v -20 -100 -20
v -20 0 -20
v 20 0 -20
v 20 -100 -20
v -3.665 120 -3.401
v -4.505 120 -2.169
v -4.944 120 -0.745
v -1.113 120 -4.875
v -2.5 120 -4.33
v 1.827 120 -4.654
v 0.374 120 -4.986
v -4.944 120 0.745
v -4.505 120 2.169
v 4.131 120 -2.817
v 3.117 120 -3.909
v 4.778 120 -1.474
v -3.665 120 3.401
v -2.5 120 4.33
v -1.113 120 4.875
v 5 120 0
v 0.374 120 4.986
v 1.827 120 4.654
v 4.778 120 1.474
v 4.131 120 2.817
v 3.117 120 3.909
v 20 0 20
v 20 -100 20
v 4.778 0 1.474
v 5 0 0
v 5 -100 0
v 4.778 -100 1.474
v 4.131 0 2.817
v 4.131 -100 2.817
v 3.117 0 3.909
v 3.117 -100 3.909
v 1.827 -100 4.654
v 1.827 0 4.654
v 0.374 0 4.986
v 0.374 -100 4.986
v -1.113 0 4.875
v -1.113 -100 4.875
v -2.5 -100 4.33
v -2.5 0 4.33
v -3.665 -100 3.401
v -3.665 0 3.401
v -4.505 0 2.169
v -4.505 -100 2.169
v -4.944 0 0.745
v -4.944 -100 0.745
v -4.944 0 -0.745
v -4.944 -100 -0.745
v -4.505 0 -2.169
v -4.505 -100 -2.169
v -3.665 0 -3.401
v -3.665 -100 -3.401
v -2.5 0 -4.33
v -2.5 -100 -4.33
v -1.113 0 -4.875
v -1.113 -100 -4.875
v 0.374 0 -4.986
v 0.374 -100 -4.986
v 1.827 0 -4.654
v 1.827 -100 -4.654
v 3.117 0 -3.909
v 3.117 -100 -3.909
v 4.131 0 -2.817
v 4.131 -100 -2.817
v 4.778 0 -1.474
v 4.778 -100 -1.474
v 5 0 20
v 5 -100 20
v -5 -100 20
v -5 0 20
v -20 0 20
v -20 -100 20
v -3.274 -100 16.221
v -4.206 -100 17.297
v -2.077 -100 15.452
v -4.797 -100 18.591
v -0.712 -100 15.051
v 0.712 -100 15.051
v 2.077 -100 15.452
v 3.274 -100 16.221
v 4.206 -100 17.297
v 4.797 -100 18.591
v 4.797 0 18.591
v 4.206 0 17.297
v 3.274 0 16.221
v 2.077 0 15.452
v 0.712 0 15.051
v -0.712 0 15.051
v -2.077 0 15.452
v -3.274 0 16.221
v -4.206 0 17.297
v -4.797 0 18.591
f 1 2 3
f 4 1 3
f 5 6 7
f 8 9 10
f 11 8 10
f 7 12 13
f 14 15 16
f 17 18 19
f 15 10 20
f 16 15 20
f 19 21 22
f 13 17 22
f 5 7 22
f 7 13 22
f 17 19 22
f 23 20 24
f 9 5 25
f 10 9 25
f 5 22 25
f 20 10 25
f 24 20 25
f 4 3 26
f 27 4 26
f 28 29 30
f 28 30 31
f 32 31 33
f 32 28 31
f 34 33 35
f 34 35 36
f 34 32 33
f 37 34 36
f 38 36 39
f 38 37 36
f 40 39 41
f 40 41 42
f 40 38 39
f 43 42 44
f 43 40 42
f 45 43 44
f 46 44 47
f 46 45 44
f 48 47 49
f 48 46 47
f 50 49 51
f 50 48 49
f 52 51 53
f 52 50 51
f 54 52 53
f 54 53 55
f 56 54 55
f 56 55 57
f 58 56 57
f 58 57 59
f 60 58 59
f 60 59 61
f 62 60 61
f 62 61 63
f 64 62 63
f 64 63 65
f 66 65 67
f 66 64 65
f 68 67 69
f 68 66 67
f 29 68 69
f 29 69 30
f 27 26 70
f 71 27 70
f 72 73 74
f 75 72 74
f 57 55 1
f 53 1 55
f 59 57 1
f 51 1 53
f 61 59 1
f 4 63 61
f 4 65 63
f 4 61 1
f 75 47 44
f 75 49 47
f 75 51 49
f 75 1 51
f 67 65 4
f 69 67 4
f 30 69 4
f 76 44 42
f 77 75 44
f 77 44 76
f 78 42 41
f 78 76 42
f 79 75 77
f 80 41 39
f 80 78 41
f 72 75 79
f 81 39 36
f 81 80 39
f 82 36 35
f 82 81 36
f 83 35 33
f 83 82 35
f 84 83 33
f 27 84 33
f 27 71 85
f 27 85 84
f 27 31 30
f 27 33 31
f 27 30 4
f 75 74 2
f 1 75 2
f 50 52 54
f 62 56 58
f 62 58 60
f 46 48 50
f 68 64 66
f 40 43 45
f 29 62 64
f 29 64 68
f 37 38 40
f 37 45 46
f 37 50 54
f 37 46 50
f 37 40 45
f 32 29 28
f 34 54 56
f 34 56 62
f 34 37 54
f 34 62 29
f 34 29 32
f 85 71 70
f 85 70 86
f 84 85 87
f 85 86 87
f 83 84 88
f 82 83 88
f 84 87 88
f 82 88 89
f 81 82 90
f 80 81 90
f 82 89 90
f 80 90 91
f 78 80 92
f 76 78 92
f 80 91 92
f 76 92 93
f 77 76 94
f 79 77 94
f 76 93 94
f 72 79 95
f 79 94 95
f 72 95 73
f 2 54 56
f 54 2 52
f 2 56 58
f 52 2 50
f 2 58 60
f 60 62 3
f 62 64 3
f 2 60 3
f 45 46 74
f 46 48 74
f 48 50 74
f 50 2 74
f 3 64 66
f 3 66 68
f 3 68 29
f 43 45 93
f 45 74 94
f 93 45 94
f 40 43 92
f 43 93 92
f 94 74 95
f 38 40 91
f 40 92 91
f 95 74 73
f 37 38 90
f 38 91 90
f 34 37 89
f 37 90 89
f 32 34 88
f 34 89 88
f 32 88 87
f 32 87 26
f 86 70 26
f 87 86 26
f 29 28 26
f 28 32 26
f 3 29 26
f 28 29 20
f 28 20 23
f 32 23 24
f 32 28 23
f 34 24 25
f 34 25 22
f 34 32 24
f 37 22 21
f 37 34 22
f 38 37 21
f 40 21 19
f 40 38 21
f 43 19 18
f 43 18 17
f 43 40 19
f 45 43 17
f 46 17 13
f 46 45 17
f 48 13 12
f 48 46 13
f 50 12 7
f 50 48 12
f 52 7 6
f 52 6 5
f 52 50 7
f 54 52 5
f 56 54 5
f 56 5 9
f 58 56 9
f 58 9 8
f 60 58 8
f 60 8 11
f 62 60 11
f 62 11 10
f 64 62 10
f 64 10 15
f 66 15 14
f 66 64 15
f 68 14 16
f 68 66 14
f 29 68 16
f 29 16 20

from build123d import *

# Parameters (mm, degrees)
F0_R     = 5
F1_DEPTH = 100
F2_R     = 5
F3_DEPTH = 120


with BuildPart() as f1:
    # F0 (on Front) → F1 (new body)
    with BuildSketch(Plane.XZ):
        with BuildLine():
            Line((-5, 20), (-20, 20))
            Line((-20, 20), (-20, -20))
            Line((-20, -20), (20, -20))
            Line((20, -20), (20, 20))
            Line((20, 20), (5, 20))
            ThreePointArc((5, 20), (0, 15), (-5, 20))
        make_face()
        Circle(F0_R, mode=Mode.SUBTRACT)
    extrude(amount=F1_DEPTH)


with BuildPart() as f3:
    # F2 (on Front) → F3 (new body)
    with BuildSketch(Plane.XZ):
        Circle(F2_R)
    extrude(amount=-F3_DEPTH)


solid = Compound([f1.part, f3.part])
